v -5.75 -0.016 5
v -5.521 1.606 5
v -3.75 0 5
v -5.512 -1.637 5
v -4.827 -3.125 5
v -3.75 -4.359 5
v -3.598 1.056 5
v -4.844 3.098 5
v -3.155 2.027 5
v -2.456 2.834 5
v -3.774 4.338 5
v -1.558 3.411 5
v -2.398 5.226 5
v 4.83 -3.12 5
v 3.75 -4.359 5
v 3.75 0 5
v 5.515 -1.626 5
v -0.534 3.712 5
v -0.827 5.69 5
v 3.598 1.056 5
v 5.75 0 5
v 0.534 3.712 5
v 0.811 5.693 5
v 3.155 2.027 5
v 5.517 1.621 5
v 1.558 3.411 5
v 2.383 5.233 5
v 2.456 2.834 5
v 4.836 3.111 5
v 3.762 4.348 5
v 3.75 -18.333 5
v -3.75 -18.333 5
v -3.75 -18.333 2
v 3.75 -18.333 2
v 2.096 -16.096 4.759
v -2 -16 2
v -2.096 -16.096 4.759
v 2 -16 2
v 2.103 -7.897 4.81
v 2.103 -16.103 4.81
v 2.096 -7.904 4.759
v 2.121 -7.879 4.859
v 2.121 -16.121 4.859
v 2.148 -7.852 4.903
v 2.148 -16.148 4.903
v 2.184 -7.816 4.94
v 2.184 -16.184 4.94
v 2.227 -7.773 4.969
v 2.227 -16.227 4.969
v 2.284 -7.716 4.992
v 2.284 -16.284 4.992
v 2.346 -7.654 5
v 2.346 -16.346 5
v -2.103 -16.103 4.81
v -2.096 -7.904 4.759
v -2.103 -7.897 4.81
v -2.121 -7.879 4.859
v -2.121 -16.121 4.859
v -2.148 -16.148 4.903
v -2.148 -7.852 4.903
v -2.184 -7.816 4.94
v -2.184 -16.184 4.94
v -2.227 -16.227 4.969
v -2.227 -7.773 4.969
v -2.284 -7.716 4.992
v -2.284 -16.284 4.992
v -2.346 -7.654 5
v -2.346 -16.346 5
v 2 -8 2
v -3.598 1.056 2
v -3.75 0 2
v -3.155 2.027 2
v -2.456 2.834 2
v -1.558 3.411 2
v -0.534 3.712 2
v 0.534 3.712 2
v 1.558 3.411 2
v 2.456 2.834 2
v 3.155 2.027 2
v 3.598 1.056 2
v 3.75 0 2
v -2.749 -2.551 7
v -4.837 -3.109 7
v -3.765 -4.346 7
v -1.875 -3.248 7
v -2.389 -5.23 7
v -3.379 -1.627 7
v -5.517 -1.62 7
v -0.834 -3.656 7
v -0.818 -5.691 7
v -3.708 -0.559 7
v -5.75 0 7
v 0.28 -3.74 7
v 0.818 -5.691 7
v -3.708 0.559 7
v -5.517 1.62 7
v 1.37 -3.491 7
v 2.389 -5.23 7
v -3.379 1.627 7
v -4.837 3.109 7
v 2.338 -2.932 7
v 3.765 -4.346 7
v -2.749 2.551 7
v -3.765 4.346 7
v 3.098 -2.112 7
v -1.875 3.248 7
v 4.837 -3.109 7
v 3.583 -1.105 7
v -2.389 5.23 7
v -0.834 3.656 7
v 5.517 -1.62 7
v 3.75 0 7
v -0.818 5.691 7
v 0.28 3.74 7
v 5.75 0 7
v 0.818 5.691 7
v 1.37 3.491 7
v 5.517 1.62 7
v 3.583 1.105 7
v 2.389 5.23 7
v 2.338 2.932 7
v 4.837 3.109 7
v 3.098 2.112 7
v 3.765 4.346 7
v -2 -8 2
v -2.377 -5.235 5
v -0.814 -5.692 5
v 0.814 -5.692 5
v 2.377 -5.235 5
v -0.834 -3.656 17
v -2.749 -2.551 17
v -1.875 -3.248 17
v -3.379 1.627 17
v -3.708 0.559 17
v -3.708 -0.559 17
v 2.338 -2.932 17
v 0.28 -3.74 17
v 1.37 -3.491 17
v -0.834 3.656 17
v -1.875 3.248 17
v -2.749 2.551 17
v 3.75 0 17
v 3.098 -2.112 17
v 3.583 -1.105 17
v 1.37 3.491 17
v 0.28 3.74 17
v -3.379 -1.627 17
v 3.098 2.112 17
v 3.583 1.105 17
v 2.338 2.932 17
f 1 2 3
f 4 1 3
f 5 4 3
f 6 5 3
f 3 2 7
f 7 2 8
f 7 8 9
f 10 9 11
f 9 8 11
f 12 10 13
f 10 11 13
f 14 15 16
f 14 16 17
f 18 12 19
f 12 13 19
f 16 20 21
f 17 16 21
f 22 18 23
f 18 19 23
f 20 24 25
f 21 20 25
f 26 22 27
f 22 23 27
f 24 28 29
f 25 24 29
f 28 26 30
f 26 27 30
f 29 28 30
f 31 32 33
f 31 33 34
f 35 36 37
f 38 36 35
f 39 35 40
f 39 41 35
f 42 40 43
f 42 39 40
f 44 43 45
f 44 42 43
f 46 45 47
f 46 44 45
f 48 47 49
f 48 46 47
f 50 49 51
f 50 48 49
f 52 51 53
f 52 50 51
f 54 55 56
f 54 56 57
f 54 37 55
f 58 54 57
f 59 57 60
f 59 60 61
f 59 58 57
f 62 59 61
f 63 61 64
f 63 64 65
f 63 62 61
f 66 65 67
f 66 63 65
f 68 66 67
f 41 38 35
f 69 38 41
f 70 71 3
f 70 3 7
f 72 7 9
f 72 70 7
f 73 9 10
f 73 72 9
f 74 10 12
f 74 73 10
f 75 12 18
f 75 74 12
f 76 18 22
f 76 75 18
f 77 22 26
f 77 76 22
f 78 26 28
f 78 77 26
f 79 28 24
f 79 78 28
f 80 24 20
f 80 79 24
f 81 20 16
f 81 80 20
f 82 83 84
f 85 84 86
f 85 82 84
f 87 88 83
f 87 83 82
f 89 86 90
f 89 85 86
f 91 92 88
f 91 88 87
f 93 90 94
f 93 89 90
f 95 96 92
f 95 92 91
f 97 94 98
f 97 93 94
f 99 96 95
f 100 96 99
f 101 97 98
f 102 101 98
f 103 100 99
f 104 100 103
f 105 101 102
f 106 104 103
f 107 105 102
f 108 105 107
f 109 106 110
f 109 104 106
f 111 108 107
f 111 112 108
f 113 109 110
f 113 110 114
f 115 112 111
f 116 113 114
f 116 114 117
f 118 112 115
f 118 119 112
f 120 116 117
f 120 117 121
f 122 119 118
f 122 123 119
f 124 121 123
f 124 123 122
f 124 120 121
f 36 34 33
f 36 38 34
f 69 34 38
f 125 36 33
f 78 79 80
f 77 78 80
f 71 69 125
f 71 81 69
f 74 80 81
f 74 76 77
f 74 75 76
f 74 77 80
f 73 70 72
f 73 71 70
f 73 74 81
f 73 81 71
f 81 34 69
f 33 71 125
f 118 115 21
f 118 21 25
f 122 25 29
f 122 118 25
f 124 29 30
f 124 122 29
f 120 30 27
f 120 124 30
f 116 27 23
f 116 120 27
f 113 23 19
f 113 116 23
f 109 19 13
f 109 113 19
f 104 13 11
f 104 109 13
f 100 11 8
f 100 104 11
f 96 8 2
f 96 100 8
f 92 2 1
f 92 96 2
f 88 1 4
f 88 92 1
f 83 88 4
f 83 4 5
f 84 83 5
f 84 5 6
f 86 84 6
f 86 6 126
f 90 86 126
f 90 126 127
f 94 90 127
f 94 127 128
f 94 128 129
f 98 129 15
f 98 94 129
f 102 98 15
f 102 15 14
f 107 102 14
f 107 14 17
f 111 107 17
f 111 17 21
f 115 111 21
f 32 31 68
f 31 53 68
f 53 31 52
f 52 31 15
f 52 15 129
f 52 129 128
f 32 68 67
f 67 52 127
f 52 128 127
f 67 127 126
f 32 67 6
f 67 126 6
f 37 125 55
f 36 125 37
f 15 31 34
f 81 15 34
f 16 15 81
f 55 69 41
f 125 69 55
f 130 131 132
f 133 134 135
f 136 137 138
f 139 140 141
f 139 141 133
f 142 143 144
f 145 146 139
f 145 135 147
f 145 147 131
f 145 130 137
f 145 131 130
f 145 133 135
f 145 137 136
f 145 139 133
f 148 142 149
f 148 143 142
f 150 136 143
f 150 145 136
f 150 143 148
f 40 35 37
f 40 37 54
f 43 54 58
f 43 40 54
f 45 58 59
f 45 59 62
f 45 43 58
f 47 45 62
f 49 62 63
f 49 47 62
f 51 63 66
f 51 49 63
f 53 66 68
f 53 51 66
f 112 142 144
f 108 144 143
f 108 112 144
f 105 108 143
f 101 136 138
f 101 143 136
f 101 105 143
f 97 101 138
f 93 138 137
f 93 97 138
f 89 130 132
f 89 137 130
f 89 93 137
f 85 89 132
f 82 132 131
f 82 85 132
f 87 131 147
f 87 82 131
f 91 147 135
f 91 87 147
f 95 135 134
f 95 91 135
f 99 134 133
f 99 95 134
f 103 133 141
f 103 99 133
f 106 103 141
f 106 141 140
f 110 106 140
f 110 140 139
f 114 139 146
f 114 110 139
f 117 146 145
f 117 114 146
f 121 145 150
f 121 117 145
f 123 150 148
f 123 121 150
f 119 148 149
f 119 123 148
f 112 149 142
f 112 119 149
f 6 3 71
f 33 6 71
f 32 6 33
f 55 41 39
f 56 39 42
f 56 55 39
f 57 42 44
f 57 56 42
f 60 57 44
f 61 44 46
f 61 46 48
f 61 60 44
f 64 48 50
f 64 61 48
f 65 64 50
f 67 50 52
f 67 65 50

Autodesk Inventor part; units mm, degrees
ref_plane "YZ Plane" through (0, 0, 0) normal (1, 0, 0) x (0, 1, 0)
sketch "Sketch1" plane through (0, 0, 0) normal (0, 0, 1) x (1, 0, 0)
  circle A0 centre (0, 0) radius 10
  dimension "d0" = 20
extrude "Extrusion1" add sketch "Sketch1" along normal blind 2
sketch "Sketch2" plane through (0, 0, 2) normal (0, 0, 1) x (1, 0, 0)
  circle A0 centre (0, 0) radius 3.75
  dimension "d3" = 7.5
extrude "Extrusion2" add sketch "Sketch2" along normal blind 15
ref_plane "Work Plane2" through (0, 0, 7) normal (0, 0, 1) x (1, 0, 0)
sketch "Sketch7" plane through (0, 0, 7) normal (0, 0, 1) x (1, 0, 0)
  circle A0 centre (0, 0) radius 3.75 projected
  circle A1 centre (0, 0) radius 5.75
  dimension "d27" = 2
extrude "Extrusion7" add sketch "Sketch7" against normal blind 2
sketch "Sketch8" plane through (0, 0, 5) normal (0, 0, -1) x (-1, 0, 0)
  circle A0 centre (0, 0) radius 5.75 projected
  circle A1 centre (0, 0) radius 3.75 projected
  circle A2 centre (0, 0) radius 5.75 construction
  line L0 (5.75, 0) -> (-5.75, 0) construction
  line L1 (-3.75, 0) -> (3.75, 0)
  line L2 (3.75, 0) -> (3.75, -18.3333)
  line L3 (3.75, -18.3333) -> (-3.75, -18.3333)
  line L4 (-3.75, -18.3333) -> (-3.75, 0)
  dimension "d31" = 18.3333
extrude "Extrusion8" add sketch "Sketch8" along normal blind 3 contours L4 A1 L2 A0 | A0 L2 L3 L4 picked at (2.8343, -4.1874)
sketch "Sketch9" plane through (0, 0, 2) normal (0, 0, -1) x (-1, 0, 0)
  arc A0 (-3.75, -4.3589) -> (3.75, -4.3589) centre (0, 0) ccw projected
  line L0 (3.75, -18.3333) -> (3.75, -4.3589) projected
  line L1 (-3.75, -18.3333) -> (3.75, -18.3333) projected
  line L2 (-3.75, -4.3589) -> (-3.75, -18.3333) projected
  line L3 (-2, -8) -> (2, -8)
  line L4 (2, -8) -> (2, -16)
  line L5 (2, -16) -> (-2, -16)
  line L6 (-2, -16) -> (-2, -8)
  dimension "d34" = 2
  dimension "d35" = 4
  dimension "d36" = 8
  dimension "d37" = 8
extrude "Extrusion9" cut sketch "Sketch9" against normal up to surface (3 mm away) draft 2 contours L3 L4 L5 L6
fillet "Fillet2" radius 0.25 4 edges at (0, -16.1048, 5) (2.1048, -12, 5) (-2.1048, -12, 5) (0, -7.8952, 5)
ref_plane "Work Plane3" through (0, 0, 2) normal (0, 0, -1) x (-1, 0, 0)
split "Split1" plane through (0, 0, 2) removes the side toward (0, 0, -1)
equation "\"d1\" = IG_gearThickness"
equation "\"d3\" = IG_shaftDiameter"
equation "\"d4\" = IG_shaftLength"
equation "\"Wheel_Related_W_\" = 0"
equation "\"W_innerDepth\" = 4"
equation "\"W_wallThickness\" = 2"
equation "\"W_holesClearance\" = 0.3"
equation "\"W_outerGearHoleDiameter\" = 5.3"
equation "\"W_innerGearHoleDiameter\" = 10.1"
equation "\"TempSpotReserved7\" = 0"
equation "\"TempSpotReserved8\" = 0"
equation "\"TempSpotReserved9\" = 0"
equation "\"TempSpotReserved10\" = 0"
equation "\"TempSpotReserved11\" = 0"
equation "\"TempSpotReserved12\" = 0"
equation "\"TempSpotReserved13\" = 0"
equation "\"TempSpotReserved14\" = 0"
equation "\"TempSpotReserved15\" = 0"
equation "\"TempSpotReserved16\" = 0"
equation "\"TempSpotReserved17\" = 0"
equation "\"TempSpotReserved18\" = 0"
equation "\"TempSpotReserved19\" = 0"
equation "\"TempSpotReserved20\" = 0"
equation "\"Inner_Gear_Related_IG_\" = 0"
equation "\"IG_shaftDiameter\" = 7.5"
equation "\"IG_shaftLength\" = 15"
equation "\"IG_gearThickness\" = 2"
equation "\"TempSpotReserved25\" = 0"
equation "\"TempSpotReserved26\" = 0"
equation "\"TempSpotReserved27\" = 0"
equation "\"TempSpotReserved28\" = 0"
equation "\"TempSpotReserved29\" = 0"
equation "\"TempSpotReserved30\" = 0"
equation "\"TempSpotReserved31\" = 0"
equation "\"TempSpotReserved32\" = 0"
equation "\"TempSpotReserved33\" = 0"
equation "\"TempSpotReserved34\" = 0"
equation "\"TempSpotReserved35\" = 0"
equation "\"TempSpotReserved36\" = 0"
equation "\"TempSpotReserved37\" = 0"
equation "\"TempSpotReserved38\" = 0"
equation "\"TempSpotReserved39\" = 0"
equation "\"TempSpotReserved40\" = 0"
equation "\"Outer_Gear_Related_OG_\" = 0"
equation "\"OG_distanceFromCenter\" = 23.33333"
equation "\"OG_shaftDiameter\" = 5"
equation "\"OG_gearDiameter\" = 26.66667"
equation "\"OG_shaftLength\" = 7"
equation "\"OG_gearThickness\" = 2"
equation "\"TempSpotReserved47\" = 0"
equation "\"TempSpotReserved48\" = 0"
equation "\"TempSpotReserved49\" = 0"
equation "\"TempSpotReserved50\" = 0"
equation "\"TempSpotReserved51\" = 0"
equation "\"TempSpotReserved52\" = 0"
equation "\"TempSpotReserved53\" = 0"
equation "\"TempSpotReserved54\" = 0"
equation "\"TempSpotReserved55\" = 0"
equation "\"TempSpotReserved56\" = 0"
equation "\"TempSpotReserved57\" = 0"
equation "\"TempSpotReserved58\" = 0"
equation "\"TempSpotReserved59\" = 0"
equation "\"TempSpotReserved60\" = 0"
equation "\"Leg_Extensions_Related_LE_\" = 0"
equation "\"LE_baseDiameter\" = 5"
equation "\"LE_maxLength\" = 24.6522"
equation "\"LE_thickness\" = 2.5"
equation "\"IG_ratioToOuterGear\" = 0.75"
equation "\"B_bearingThickness\" = 1"
equation "\"TempSpotReserved43\" = 0"
equation "\"TempSpotReserved45\" = 0"
equation "\"Thisisatest\" = 25.4"
equation "\"TempSpotReserved46\" = 0"
equation "\"TempSpotReserved44\" = 0"
equation "\"LE_offsetAboveOuterGear\" = 0"
equation "\"Bearing_Related_B_\" = 0"
equation "\"TempSpotReserved42\" = 0"
equation "\"OG_skirtOffset\" = 1"
equation "\"OG_skirtThickness\" = 1"
equation "\"IG_skirtThickness\" = 2"
equation "\"IG_extentionLength\" = 18.33333"
equation "\"IG_extentionThickness\" = 3"
equation "\"IG_slitWidth\" = 4"
equation "\"IG_slitlength\" = 8"
equation "\"IG_slitDistanceFromCenterHole\" = 8"
equation "\"IG_slitClearance\" = 0.2"
equation "\"Reserved_10\" = 0"
equation "\"Reserved_9\" = 0"
equation "\"Reserved_11\" = 0"
equation "\"Reserved_12\" = 0"
equation "\"Reserved_8\" = 0"
equation "\"Reserved_7\" = 0"
equation "\"Reserved_26\" = 0"
equation "\"Reserved_20\" = 0"
equation "\"Reserved_22\" = 0"
equation "\"Reserved_23\" = 0"
equation "\"Reserved_25\" = 0"
equation "\"Reserved_24\" = 0"
equation "\"Reserved_21\" = 0"
equation "\"Reserved_19\" = 0"
equation "\"Reserved_27\" = 0"
equation "\"Reserved_14\" = 0"
equation "\"Reserved_15\" = 0"
equation "\"Reserved_16\" = 0"
equation "\"Reserved_13\" = 0"
equation "\"Reserved_17\" = 0"
equation "\"Reserved_18\" = 0"
equation "\"Bearing_Related_BR_\" = 0"
equation "\"BR_bearingThickness\" = 1"
equation "\"Block_Related_BL_\" = 0"
equation "\"BL_width\" = 3.8"
equation "\"BL_length\" = 7.8"
equation "\"W_filletRadius\" = 0.25"
equation "\"W_extrutsionTaperAngle\" = 2deg"
equation "\"OG_protrudeDistance\" = 3"
properties part number "innerGear1"
